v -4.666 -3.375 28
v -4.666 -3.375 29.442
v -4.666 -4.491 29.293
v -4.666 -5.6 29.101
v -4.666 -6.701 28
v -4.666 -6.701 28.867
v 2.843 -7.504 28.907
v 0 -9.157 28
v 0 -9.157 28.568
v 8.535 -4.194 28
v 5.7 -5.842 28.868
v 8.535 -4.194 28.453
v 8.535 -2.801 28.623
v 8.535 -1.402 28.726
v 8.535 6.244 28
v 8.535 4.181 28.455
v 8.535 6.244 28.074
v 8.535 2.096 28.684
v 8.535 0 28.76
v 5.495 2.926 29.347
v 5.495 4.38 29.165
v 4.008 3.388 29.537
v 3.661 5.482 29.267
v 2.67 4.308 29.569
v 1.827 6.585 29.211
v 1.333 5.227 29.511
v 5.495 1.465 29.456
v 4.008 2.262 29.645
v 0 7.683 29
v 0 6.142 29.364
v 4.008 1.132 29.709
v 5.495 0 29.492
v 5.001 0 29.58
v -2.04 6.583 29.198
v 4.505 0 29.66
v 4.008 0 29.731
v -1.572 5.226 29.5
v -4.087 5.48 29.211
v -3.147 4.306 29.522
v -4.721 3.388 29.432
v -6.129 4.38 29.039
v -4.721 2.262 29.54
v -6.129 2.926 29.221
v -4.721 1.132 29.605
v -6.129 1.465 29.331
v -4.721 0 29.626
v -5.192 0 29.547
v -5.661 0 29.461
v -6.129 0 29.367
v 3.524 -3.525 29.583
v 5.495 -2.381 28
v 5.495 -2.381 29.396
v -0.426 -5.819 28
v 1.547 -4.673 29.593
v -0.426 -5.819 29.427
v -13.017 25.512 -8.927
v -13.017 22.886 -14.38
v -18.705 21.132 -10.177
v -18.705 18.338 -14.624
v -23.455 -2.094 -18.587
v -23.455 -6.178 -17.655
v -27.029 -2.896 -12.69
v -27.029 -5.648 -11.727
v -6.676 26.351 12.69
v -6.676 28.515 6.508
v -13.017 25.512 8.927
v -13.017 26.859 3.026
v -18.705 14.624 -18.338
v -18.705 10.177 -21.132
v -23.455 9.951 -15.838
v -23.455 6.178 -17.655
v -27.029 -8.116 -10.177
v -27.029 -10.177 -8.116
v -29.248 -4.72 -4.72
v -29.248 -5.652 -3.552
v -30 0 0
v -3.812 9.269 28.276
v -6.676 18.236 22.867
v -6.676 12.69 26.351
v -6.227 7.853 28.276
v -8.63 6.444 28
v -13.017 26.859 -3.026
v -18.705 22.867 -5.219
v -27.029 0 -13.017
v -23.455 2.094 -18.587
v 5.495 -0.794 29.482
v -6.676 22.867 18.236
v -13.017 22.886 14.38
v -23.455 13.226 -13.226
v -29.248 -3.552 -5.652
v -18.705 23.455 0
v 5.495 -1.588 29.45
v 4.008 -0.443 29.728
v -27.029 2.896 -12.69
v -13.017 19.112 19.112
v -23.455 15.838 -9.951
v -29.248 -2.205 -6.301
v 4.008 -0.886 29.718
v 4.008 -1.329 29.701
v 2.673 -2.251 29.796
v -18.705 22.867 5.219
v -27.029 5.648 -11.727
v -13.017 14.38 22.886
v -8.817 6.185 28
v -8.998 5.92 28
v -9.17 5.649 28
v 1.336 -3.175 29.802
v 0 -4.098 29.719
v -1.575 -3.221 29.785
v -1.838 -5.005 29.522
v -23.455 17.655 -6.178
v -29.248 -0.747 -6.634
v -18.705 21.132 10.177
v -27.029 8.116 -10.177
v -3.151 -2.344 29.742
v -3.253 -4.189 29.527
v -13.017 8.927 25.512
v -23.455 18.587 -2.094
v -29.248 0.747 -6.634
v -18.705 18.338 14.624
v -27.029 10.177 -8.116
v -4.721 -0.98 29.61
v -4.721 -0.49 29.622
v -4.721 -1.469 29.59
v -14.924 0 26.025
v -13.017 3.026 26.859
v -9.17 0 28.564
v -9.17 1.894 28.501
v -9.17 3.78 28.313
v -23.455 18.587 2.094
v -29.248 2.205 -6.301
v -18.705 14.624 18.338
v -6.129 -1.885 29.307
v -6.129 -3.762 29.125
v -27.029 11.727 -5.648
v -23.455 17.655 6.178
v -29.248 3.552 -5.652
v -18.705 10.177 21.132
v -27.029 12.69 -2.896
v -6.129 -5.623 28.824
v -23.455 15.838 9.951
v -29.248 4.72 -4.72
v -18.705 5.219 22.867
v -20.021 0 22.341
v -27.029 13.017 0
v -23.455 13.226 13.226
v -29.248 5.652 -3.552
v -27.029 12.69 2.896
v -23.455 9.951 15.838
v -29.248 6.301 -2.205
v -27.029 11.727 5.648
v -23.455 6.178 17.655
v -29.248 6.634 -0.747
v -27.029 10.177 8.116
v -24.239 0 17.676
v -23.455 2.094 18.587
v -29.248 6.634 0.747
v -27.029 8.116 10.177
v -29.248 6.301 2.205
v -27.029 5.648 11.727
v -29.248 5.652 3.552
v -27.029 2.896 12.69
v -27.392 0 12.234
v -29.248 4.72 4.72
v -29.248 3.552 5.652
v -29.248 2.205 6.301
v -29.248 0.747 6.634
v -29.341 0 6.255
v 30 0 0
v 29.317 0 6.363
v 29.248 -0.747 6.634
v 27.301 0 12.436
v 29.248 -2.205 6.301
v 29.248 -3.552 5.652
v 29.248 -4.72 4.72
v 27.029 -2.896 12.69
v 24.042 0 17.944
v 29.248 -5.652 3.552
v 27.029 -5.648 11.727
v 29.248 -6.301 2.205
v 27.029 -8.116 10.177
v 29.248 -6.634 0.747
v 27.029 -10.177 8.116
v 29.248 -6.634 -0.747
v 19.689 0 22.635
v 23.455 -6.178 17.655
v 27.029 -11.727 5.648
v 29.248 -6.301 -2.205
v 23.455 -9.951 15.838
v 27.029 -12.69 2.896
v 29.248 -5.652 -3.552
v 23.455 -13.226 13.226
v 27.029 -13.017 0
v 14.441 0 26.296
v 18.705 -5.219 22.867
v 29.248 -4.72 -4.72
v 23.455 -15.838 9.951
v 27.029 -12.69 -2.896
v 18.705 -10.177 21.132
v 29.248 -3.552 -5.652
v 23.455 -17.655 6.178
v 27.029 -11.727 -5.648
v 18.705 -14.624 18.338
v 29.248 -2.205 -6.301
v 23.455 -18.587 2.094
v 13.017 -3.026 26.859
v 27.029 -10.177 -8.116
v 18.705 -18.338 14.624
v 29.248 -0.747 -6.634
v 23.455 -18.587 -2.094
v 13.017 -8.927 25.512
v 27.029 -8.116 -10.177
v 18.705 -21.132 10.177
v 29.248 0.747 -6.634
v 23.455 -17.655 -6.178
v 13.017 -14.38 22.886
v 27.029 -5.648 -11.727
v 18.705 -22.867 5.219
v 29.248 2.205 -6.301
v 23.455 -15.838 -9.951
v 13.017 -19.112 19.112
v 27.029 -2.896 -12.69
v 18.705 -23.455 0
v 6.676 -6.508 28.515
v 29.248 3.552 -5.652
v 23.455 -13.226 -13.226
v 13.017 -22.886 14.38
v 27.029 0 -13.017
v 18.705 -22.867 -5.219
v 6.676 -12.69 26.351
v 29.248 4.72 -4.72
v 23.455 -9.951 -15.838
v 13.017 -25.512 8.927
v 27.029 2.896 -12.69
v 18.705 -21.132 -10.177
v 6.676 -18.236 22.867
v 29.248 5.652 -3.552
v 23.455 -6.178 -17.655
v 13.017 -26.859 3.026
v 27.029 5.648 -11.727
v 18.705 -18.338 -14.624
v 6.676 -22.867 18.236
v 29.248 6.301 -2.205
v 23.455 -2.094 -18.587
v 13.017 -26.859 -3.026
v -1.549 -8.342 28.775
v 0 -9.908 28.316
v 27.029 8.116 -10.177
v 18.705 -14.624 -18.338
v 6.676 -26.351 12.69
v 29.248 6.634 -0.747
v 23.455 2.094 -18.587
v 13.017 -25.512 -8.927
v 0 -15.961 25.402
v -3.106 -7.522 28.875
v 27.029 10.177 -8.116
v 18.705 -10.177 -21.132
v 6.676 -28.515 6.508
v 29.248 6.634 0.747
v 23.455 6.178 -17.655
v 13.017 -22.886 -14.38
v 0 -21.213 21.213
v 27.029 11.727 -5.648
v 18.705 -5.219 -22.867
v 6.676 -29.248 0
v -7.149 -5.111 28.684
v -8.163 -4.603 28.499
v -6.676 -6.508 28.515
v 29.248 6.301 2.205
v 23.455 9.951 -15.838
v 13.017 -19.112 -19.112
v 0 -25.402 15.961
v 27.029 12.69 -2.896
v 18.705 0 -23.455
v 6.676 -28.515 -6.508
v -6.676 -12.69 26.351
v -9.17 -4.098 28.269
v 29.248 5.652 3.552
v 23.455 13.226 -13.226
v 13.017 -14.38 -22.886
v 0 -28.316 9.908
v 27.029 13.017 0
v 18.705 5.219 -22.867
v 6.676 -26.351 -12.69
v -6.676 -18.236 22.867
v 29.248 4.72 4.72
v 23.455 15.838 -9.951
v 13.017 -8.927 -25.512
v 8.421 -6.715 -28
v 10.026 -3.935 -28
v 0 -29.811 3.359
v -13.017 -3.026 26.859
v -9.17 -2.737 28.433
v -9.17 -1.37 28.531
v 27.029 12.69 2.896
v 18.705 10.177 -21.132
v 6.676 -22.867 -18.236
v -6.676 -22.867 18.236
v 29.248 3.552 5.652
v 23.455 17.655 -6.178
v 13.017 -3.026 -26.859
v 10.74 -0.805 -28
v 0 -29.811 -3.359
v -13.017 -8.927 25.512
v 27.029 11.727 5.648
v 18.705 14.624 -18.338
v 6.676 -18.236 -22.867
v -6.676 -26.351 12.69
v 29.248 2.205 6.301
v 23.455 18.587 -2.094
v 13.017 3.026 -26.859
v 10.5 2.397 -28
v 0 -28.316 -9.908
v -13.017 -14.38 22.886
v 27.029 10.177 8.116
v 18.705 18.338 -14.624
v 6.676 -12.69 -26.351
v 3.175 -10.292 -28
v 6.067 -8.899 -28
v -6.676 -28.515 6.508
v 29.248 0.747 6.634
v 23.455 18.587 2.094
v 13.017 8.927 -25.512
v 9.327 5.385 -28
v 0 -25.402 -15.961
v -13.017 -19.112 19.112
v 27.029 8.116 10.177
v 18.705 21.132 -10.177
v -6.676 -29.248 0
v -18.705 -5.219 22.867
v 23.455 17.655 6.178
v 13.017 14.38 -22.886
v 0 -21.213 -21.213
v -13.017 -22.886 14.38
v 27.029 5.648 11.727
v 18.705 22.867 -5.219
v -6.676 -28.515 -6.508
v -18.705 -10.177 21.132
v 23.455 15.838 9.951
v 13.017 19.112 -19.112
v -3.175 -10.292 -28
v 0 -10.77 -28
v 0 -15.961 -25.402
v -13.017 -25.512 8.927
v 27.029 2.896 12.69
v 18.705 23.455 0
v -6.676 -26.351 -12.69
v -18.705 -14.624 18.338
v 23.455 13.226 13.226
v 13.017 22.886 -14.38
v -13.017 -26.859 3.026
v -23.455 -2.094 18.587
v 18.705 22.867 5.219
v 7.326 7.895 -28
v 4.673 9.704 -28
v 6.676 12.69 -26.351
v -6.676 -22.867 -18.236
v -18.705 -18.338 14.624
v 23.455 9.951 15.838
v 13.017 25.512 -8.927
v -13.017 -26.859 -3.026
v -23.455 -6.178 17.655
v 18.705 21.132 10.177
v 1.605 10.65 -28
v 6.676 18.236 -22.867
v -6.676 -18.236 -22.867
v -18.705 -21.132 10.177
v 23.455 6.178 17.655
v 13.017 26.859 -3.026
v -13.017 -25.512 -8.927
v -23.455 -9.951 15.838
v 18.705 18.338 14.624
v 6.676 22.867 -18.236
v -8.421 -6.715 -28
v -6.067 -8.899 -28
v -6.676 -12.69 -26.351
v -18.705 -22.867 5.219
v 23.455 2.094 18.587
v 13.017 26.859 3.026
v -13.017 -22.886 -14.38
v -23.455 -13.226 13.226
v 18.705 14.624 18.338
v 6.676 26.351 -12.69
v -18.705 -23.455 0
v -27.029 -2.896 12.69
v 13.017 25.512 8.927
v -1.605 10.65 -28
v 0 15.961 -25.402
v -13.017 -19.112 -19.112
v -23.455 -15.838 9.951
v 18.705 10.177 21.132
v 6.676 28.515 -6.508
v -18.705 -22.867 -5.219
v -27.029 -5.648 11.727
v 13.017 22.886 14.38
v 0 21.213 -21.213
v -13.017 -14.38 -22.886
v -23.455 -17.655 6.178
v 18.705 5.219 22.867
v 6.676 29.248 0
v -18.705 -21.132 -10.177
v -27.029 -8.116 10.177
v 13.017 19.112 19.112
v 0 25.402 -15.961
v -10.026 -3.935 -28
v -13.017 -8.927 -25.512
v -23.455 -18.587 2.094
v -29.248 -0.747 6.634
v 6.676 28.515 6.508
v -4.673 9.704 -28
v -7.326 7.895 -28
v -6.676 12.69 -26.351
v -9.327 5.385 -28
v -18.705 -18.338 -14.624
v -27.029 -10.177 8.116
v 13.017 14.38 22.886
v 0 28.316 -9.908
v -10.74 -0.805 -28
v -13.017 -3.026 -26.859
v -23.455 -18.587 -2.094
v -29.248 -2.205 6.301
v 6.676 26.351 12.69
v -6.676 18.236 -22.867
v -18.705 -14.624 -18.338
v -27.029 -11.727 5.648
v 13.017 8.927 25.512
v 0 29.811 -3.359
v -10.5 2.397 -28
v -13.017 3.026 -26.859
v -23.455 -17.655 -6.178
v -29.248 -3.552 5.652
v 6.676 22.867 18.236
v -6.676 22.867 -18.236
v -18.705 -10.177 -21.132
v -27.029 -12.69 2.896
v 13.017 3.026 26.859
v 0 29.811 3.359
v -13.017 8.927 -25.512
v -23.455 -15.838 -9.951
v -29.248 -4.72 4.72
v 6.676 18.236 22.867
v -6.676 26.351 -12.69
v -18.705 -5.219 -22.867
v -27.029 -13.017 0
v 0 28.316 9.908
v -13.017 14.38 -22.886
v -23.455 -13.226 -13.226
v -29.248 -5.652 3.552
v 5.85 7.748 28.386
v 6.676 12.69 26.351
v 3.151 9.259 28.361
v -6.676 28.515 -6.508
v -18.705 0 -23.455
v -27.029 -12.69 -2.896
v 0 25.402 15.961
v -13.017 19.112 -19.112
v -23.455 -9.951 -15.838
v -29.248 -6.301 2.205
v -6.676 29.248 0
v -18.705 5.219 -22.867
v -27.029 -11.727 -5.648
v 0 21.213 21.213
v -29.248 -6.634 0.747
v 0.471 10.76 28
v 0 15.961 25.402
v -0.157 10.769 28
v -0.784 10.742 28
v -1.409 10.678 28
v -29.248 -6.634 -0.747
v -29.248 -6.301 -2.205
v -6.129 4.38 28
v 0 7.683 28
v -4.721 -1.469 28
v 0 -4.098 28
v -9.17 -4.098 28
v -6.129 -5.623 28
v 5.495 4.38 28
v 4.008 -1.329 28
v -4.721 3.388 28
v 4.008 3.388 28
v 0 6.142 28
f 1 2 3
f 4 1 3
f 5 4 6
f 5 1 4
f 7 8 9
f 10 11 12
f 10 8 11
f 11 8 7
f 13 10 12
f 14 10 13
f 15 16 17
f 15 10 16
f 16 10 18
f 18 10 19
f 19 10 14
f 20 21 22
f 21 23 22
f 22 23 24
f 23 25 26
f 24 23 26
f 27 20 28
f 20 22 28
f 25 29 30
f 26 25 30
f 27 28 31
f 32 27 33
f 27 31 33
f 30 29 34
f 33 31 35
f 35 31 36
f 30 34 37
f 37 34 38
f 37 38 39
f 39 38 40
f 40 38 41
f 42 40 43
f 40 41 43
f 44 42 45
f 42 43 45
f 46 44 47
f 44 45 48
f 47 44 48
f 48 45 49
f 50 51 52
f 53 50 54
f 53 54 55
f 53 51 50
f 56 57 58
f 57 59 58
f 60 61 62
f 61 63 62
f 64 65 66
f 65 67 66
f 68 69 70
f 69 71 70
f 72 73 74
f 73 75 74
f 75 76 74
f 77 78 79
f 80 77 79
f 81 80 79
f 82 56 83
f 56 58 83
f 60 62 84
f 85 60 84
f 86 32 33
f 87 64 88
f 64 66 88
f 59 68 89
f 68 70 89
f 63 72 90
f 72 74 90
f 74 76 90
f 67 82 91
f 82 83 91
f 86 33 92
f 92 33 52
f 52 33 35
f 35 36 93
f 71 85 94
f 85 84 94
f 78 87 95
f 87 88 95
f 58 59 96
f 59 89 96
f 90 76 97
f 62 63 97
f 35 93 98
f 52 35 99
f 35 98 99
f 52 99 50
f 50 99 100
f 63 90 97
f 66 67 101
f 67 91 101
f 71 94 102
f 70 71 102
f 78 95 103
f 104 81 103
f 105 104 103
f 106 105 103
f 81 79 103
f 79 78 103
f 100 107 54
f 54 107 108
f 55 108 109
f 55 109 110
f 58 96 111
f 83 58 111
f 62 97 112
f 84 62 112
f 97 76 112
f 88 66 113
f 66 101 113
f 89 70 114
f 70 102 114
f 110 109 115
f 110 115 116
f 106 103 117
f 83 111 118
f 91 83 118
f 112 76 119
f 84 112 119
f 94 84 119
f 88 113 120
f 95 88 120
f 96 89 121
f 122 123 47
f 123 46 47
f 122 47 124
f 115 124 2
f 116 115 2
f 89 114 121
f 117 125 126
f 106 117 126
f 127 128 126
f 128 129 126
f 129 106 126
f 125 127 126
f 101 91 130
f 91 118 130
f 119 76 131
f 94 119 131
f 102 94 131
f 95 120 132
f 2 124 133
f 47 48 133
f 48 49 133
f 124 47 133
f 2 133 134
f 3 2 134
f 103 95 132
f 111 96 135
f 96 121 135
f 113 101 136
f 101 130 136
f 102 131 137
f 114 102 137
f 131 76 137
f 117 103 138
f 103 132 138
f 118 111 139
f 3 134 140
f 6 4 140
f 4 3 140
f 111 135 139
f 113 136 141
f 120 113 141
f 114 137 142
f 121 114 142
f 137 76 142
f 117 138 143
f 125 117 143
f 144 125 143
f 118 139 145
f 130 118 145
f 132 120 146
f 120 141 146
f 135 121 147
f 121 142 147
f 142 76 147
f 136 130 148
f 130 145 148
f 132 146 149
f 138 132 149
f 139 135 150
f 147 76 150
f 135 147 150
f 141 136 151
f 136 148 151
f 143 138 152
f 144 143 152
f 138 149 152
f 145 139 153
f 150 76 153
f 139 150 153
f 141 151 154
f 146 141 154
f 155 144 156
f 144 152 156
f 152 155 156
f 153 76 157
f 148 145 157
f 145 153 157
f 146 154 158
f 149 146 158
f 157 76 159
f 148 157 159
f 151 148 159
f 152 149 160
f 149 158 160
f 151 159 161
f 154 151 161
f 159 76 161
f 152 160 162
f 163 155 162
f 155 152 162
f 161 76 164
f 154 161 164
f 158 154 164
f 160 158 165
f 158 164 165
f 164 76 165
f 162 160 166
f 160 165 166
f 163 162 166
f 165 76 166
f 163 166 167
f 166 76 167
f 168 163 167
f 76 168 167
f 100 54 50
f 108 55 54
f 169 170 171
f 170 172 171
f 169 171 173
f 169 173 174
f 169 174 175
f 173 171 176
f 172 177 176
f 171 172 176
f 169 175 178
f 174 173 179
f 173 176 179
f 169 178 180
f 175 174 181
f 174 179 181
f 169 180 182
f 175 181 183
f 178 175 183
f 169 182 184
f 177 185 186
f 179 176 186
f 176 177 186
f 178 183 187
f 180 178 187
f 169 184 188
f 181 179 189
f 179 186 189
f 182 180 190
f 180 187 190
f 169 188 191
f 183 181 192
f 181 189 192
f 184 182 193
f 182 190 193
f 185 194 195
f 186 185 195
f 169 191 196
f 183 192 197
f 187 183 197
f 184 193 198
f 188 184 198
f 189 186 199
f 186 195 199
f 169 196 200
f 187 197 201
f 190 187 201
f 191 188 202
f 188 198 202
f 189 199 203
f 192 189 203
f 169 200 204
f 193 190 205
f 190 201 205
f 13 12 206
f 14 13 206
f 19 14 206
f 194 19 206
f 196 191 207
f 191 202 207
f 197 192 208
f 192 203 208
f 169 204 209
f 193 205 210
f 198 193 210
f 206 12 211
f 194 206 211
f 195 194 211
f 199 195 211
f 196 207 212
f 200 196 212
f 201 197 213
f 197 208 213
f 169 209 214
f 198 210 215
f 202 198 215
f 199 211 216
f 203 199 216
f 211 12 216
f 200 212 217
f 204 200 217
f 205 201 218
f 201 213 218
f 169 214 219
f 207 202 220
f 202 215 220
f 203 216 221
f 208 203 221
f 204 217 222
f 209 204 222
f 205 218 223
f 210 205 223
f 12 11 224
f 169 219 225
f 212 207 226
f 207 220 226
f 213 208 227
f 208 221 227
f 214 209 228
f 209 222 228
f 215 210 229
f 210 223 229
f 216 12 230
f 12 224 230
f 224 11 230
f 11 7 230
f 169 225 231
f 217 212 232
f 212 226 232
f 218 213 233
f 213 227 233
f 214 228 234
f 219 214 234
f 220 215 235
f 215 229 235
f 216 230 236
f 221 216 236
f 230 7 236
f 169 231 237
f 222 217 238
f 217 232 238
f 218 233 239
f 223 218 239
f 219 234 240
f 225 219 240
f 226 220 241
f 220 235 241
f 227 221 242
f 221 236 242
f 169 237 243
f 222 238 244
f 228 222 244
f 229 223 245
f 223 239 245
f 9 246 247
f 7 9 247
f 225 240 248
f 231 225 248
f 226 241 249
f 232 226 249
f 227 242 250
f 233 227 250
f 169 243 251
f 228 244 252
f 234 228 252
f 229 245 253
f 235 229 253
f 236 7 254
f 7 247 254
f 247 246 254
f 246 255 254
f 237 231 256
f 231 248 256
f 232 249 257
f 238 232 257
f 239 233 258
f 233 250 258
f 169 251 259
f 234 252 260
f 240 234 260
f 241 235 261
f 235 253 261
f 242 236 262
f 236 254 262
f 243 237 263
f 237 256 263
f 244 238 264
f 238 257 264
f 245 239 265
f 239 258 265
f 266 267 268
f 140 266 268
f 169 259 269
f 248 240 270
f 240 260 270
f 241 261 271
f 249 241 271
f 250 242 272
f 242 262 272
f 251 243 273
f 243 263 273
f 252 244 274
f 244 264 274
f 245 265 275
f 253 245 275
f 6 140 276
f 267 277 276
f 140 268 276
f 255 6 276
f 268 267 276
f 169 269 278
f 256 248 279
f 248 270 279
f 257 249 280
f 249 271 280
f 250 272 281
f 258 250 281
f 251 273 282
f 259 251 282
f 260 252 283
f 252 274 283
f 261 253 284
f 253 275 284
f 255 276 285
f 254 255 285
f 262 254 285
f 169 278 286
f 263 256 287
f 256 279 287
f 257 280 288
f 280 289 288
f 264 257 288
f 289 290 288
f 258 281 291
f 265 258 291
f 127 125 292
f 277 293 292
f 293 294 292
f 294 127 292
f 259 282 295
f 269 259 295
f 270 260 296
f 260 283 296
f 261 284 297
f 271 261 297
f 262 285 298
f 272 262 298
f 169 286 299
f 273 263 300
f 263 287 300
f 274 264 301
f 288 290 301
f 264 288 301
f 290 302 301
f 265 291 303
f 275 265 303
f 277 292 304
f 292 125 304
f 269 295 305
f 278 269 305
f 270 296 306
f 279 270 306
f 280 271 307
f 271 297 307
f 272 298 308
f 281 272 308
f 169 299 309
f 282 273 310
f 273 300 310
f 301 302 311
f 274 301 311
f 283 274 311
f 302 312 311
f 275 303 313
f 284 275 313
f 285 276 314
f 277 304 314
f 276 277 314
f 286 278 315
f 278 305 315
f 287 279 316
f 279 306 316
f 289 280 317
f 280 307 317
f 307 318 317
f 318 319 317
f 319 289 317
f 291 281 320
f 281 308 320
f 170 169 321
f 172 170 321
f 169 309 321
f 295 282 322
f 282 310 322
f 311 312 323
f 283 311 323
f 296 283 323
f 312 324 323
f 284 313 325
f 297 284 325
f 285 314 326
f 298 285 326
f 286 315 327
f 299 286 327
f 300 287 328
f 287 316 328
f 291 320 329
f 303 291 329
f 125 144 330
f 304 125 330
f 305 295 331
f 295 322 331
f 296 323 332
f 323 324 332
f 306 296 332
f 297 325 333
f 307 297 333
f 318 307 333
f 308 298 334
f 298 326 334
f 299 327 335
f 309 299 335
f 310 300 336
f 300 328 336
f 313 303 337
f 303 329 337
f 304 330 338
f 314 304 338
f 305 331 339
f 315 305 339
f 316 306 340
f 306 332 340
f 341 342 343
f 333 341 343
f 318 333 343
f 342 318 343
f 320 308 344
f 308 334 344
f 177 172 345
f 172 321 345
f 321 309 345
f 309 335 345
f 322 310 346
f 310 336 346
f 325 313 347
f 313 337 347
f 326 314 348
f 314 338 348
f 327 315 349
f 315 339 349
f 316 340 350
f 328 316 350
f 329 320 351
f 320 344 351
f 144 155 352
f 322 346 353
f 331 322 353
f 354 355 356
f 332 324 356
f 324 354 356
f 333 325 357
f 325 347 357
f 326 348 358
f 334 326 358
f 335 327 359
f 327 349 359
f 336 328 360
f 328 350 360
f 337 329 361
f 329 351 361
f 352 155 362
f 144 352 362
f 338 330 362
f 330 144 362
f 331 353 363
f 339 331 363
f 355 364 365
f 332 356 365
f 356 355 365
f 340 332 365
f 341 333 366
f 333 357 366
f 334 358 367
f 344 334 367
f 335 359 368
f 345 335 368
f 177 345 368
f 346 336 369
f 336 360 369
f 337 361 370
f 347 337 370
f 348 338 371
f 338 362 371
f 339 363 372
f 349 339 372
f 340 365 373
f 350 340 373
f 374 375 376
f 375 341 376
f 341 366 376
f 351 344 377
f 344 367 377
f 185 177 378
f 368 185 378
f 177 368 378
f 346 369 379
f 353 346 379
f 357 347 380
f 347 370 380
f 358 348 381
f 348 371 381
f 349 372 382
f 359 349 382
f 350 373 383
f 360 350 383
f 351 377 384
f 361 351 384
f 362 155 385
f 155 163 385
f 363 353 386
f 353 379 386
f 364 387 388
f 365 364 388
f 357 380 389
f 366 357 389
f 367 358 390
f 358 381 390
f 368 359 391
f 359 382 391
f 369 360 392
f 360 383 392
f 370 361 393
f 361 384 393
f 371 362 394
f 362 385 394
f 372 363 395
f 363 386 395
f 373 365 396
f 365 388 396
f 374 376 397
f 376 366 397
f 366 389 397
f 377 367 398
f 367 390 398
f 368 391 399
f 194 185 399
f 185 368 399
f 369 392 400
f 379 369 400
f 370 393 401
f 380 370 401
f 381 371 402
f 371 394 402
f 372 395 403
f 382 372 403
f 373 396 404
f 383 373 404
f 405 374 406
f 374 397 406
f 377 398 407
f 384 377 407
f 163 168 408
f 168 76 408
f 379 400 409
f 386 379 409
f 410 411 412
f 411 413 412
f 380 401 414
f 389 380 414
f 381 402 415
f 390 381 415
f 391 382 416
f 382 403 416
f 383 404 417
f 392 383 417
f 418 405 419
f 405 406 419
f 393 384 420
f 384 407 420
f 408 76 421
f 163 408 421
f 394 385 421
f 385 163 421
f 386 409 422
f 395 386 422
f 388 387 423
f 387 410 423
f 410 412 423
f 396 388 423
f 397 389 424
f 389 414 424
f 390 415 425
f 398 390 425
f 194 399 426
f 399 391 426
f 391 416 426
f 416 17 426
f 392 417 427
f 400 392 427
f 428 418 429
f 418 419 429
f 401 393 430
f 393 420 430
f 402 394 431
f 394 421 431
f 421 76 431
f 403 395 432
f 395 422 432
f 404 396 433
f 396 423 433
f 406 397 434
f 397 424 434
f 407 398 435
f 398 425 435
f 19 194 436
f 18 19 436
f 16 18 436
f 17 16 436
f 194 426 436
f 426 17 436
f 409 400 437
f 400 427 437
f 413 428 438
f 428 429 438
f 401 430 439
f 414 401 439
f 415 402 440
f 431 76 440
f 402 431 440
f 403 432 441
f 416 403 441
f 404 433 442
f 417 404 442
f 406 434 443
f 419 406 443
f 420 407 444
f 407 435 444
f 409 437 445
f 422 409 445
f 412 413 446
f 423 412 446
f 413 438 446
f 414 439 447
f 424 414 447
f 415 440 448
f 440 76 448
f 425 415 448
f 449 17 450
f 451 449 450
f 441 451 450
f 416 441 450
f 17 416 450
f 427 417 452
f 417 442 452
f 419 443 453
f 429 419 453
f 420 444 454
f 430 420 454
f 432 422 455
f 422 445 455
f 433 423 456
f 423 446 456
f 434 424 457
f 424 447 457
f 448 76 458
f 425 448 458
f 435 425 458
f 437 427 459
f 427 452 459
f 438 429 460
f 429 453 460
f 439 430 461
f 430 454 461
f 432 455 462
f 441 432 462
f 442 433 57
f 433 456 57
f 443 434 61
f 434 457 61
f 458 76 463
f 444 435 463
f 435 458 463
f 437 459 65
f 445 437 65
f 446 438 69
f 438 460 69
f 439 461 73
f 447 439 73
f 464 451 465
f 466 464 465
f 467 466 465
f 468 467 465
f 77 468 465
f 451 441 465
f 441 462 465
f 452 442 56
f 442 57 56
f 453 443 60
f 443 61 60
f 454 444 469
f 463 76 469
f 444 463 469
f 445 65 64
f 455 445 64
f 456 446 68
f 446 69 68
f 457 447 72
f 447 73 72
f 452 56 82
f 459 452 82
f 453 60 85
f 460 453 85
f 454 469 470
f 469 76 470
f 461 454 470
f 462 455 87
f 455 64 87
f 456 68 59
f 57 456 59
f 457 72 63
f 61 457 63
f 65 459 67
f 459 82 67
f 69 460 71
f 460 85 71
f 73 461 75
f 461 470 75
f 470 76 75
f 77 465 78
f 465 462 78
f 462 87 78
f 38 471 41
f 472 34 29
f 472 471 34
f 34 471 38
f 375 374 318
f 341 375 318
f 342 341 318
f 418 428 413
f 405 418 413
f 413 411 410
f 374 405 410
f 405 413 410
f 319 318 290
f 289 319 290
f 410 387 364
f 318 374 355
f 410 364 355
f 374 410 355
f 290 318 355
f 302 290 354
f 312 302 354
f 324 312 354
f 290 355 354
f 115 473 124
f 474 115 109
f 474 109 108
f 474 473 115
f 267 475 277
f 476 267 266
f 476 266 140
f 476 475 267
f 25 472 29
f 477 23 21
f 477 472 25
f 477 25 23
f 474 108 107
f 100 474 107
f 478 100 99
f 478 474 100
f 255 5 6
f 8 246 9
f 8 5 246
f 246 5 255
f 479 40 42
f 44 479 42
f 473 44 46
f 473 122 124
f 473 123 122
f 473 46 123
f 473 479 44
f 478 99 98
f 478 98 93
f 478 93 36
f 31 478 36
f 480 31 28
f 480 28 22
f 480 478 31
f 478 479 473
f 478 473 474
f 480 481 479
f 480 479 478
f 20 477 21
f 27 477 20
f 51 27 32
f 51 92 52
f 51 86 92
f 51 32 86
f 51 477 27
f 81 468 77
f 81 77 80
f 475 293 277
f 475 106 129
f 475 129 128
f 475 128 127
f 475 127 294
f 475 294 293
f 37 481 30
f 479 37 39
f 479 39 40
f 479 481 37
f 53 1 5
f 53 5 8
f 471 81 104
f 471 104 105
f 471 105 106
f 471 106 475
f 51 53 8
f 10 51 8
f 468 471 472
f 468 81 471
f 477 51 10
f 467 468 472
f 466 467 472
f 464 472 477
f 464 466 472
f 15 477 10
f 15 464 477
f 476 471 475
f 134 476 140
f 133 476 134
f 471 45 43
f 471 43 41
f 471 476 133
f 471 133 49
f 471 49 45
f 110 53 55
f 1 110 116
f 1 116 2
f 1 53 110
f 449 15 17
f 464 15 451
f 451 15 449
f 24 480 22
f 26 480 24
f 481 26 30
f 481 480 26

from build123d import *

# Parameters (mm, degrees)
F4_START = 28
F4_DEPTH = 22
F6_START = -28
F5_W     = 60
F5_H     = 60
F6_DEPTH = 72


with BuildPart() as f2:
    # F1 (on Front) → F2 (revolve)
    with BuildSketch(Plane.XZ):
        with BuildLine():
            Line((-30, 0), (30, 0))
            ThreePointArc((30, 0), (0, 30), (-30, 0))
        make_face()
    revolve(axis=Axis((0, 0, 0), (1, 0, 0)))

    # F3 (on Top) → F4 (cut)
    with BuildSketch(Plane.XY.offset(F4_START)):
        Polygon((-9.1697992757, 6.1277179047), (-9.1697992757, -4.0975827724), (-6.1292964965, -5.6231399067), (-6.1292964965, 4.3796850368), (0, 7.6826182194), (5.4949265905, 4.3796850368), (5.4949265905, -2.3808549158), (-0.4257261462, -5.8186533861), (-4.6656387858, -3.3751989249), (-4.6656387858, -6.7009669729), (0, -9.1569181532), (8.5351010785, -4.193849396), (8.5351010785, 6.2439450994), (-0.4188895691, 11.2581793219), align=None)
        Polygon((-4.7212797217, 3.3881671261), (-4.7212797217, -1.4694901183), (0, -4.0975827724), (4.0084240027, -1.328688697), (4.0084240027, 3.3881671261), (0, 6.1423662119), align=None)
    extrude(amount=F4_DEPTH, mode=Mode.SUBTRACT)

    # F5 (on Top) → F6 (cut)
    with BuildSketch(Plane.XY.offset(F6_START)):
        with Locations((1.9770637155, -0.5929265171)):
            Rectangle(F5_W, F5_H)
    extrude(amount=-F6_DEPTH, mode=Mode.SUBTRACT)


solid = f2.part
